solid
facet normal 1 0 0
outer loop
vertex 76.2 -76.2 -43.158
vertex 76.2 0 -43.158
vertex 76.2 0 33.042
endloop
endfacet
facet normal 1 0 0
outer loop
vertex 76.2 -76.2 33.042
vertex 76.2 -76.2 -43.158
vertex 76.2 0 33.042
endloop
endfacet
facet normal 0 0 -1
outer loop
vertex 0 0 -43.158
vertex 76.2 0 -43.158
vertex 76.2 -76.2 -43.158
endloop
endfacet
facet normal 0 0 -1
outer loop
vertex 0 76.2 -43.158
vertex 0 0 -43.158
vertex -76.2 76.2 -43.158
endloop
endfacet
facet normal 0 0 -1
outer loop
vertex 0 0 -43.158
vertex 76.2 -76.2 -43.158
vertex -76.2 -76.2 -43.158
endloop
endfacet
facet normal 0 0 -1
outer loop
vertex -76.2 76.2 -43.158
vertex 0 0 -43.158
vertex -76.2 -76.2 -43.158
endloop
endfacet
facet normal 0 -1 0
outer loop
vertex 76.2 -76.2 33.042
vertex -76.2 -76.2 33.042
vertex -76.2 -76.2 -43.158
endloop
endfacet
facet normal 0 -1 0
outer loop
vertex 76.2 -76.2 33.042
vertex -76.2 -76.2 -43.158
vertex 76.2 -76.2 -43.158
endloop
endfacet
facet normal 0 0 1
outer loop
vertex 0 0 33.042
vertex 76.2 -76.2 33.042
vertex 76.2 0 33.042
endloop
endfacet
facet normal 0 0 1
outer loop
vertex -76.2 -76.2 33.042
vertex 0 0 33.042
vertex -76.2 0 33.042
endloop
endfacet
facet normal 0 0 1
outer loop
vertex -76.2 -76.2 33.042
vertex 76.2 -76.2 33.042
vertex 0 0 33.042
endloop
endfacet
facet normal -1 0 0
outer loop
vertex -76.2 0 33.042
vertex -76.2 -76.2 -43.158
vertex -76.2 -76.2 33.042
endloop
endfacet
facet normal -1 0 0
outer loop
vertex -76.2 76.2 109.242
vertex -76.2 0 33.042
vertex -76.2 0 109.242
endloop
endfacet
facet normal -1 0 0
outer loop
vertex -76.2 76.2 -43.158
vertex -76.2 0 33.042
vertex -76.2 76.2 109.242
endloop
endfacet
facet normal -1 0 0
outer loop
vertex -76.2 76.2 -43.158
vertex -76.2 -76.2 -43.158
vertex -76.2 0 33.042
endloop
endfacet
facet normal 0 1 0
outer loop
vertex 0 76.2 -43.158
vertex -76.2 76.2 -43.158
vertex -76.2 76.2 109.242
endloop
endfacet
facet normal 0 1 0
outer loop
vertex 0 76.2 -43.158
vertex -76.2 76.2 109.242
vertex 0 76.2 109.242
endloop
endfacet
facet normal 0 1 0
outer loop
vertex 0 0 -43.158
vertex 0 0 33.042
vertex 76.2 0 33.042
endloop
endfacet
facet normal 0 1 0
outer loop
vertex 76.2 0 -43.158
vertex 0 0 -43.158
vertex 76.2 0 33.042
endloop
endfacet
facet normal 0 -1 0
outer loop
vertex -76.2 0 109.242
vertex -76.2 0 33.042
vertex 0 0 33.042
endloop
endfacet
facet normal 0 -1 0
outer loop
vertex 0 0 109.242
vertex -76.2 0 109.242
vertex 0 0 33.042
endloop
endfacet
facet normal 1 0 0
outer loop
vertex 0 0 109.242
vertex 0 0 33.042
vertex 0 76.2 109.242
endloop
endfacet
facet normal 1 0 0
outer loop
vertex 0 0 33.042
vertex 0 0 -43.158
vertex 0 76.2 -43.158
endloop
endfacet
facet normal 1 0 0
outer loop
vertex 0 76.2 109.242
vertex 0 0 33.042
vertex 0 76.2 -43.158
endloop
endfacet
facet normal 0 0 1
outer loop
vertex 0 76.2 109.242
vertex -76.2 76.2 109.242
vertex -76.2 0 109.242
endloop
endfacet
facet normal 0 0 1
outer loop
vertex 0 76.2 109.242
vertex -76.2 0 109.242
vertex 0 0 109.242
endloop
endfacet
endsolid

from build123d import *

# Parameters (mm, degrees)
F1_W     = 152.4
F1_H     = 76.2
F2_DEPTH = 76.2
F3_W     = 76.2
F3_H     = 76.2
F4_DEPTH = 76.2
F5_W     = 76.2
F5_H     = 76.2
F6_DEPTH = 76.2


# Not quite as in the source:
# - a variable given as a bare number and used for a length is read in inches; the dataset says mm whatever the document's units were


with BuildPart() as f2:
    # F1 (on Front) → F2 (new body)
    with BuildSketch(Plane.XZ):
        with Locations((0, -5.0575301152)):
            Rectangle(F1_W, F1_H)
    extrude(amount=F2_DEPTH)

    # F3 (on face) → F4 (join)
    with BuildSketch(Plane(origin=(0, 0, 0), x_dir=(-1, 0, 0), z_dir=(0, 1, 0))):
        with Locations((38.1, -5.0575301152)):
            Rectangle(F3_W, F3_H)
    extrude(amount=F4_DEPTH)

    # F5 (on face) → F6 (join)
    with BuildSketch(Plane.XY.offset(33.0424698848)):
        with Locations((-38.1, 38.1)):
            Rectangle(F5_W, F5_H)
    extrude(amount=F6_DEPTH)


solid = f2.part
